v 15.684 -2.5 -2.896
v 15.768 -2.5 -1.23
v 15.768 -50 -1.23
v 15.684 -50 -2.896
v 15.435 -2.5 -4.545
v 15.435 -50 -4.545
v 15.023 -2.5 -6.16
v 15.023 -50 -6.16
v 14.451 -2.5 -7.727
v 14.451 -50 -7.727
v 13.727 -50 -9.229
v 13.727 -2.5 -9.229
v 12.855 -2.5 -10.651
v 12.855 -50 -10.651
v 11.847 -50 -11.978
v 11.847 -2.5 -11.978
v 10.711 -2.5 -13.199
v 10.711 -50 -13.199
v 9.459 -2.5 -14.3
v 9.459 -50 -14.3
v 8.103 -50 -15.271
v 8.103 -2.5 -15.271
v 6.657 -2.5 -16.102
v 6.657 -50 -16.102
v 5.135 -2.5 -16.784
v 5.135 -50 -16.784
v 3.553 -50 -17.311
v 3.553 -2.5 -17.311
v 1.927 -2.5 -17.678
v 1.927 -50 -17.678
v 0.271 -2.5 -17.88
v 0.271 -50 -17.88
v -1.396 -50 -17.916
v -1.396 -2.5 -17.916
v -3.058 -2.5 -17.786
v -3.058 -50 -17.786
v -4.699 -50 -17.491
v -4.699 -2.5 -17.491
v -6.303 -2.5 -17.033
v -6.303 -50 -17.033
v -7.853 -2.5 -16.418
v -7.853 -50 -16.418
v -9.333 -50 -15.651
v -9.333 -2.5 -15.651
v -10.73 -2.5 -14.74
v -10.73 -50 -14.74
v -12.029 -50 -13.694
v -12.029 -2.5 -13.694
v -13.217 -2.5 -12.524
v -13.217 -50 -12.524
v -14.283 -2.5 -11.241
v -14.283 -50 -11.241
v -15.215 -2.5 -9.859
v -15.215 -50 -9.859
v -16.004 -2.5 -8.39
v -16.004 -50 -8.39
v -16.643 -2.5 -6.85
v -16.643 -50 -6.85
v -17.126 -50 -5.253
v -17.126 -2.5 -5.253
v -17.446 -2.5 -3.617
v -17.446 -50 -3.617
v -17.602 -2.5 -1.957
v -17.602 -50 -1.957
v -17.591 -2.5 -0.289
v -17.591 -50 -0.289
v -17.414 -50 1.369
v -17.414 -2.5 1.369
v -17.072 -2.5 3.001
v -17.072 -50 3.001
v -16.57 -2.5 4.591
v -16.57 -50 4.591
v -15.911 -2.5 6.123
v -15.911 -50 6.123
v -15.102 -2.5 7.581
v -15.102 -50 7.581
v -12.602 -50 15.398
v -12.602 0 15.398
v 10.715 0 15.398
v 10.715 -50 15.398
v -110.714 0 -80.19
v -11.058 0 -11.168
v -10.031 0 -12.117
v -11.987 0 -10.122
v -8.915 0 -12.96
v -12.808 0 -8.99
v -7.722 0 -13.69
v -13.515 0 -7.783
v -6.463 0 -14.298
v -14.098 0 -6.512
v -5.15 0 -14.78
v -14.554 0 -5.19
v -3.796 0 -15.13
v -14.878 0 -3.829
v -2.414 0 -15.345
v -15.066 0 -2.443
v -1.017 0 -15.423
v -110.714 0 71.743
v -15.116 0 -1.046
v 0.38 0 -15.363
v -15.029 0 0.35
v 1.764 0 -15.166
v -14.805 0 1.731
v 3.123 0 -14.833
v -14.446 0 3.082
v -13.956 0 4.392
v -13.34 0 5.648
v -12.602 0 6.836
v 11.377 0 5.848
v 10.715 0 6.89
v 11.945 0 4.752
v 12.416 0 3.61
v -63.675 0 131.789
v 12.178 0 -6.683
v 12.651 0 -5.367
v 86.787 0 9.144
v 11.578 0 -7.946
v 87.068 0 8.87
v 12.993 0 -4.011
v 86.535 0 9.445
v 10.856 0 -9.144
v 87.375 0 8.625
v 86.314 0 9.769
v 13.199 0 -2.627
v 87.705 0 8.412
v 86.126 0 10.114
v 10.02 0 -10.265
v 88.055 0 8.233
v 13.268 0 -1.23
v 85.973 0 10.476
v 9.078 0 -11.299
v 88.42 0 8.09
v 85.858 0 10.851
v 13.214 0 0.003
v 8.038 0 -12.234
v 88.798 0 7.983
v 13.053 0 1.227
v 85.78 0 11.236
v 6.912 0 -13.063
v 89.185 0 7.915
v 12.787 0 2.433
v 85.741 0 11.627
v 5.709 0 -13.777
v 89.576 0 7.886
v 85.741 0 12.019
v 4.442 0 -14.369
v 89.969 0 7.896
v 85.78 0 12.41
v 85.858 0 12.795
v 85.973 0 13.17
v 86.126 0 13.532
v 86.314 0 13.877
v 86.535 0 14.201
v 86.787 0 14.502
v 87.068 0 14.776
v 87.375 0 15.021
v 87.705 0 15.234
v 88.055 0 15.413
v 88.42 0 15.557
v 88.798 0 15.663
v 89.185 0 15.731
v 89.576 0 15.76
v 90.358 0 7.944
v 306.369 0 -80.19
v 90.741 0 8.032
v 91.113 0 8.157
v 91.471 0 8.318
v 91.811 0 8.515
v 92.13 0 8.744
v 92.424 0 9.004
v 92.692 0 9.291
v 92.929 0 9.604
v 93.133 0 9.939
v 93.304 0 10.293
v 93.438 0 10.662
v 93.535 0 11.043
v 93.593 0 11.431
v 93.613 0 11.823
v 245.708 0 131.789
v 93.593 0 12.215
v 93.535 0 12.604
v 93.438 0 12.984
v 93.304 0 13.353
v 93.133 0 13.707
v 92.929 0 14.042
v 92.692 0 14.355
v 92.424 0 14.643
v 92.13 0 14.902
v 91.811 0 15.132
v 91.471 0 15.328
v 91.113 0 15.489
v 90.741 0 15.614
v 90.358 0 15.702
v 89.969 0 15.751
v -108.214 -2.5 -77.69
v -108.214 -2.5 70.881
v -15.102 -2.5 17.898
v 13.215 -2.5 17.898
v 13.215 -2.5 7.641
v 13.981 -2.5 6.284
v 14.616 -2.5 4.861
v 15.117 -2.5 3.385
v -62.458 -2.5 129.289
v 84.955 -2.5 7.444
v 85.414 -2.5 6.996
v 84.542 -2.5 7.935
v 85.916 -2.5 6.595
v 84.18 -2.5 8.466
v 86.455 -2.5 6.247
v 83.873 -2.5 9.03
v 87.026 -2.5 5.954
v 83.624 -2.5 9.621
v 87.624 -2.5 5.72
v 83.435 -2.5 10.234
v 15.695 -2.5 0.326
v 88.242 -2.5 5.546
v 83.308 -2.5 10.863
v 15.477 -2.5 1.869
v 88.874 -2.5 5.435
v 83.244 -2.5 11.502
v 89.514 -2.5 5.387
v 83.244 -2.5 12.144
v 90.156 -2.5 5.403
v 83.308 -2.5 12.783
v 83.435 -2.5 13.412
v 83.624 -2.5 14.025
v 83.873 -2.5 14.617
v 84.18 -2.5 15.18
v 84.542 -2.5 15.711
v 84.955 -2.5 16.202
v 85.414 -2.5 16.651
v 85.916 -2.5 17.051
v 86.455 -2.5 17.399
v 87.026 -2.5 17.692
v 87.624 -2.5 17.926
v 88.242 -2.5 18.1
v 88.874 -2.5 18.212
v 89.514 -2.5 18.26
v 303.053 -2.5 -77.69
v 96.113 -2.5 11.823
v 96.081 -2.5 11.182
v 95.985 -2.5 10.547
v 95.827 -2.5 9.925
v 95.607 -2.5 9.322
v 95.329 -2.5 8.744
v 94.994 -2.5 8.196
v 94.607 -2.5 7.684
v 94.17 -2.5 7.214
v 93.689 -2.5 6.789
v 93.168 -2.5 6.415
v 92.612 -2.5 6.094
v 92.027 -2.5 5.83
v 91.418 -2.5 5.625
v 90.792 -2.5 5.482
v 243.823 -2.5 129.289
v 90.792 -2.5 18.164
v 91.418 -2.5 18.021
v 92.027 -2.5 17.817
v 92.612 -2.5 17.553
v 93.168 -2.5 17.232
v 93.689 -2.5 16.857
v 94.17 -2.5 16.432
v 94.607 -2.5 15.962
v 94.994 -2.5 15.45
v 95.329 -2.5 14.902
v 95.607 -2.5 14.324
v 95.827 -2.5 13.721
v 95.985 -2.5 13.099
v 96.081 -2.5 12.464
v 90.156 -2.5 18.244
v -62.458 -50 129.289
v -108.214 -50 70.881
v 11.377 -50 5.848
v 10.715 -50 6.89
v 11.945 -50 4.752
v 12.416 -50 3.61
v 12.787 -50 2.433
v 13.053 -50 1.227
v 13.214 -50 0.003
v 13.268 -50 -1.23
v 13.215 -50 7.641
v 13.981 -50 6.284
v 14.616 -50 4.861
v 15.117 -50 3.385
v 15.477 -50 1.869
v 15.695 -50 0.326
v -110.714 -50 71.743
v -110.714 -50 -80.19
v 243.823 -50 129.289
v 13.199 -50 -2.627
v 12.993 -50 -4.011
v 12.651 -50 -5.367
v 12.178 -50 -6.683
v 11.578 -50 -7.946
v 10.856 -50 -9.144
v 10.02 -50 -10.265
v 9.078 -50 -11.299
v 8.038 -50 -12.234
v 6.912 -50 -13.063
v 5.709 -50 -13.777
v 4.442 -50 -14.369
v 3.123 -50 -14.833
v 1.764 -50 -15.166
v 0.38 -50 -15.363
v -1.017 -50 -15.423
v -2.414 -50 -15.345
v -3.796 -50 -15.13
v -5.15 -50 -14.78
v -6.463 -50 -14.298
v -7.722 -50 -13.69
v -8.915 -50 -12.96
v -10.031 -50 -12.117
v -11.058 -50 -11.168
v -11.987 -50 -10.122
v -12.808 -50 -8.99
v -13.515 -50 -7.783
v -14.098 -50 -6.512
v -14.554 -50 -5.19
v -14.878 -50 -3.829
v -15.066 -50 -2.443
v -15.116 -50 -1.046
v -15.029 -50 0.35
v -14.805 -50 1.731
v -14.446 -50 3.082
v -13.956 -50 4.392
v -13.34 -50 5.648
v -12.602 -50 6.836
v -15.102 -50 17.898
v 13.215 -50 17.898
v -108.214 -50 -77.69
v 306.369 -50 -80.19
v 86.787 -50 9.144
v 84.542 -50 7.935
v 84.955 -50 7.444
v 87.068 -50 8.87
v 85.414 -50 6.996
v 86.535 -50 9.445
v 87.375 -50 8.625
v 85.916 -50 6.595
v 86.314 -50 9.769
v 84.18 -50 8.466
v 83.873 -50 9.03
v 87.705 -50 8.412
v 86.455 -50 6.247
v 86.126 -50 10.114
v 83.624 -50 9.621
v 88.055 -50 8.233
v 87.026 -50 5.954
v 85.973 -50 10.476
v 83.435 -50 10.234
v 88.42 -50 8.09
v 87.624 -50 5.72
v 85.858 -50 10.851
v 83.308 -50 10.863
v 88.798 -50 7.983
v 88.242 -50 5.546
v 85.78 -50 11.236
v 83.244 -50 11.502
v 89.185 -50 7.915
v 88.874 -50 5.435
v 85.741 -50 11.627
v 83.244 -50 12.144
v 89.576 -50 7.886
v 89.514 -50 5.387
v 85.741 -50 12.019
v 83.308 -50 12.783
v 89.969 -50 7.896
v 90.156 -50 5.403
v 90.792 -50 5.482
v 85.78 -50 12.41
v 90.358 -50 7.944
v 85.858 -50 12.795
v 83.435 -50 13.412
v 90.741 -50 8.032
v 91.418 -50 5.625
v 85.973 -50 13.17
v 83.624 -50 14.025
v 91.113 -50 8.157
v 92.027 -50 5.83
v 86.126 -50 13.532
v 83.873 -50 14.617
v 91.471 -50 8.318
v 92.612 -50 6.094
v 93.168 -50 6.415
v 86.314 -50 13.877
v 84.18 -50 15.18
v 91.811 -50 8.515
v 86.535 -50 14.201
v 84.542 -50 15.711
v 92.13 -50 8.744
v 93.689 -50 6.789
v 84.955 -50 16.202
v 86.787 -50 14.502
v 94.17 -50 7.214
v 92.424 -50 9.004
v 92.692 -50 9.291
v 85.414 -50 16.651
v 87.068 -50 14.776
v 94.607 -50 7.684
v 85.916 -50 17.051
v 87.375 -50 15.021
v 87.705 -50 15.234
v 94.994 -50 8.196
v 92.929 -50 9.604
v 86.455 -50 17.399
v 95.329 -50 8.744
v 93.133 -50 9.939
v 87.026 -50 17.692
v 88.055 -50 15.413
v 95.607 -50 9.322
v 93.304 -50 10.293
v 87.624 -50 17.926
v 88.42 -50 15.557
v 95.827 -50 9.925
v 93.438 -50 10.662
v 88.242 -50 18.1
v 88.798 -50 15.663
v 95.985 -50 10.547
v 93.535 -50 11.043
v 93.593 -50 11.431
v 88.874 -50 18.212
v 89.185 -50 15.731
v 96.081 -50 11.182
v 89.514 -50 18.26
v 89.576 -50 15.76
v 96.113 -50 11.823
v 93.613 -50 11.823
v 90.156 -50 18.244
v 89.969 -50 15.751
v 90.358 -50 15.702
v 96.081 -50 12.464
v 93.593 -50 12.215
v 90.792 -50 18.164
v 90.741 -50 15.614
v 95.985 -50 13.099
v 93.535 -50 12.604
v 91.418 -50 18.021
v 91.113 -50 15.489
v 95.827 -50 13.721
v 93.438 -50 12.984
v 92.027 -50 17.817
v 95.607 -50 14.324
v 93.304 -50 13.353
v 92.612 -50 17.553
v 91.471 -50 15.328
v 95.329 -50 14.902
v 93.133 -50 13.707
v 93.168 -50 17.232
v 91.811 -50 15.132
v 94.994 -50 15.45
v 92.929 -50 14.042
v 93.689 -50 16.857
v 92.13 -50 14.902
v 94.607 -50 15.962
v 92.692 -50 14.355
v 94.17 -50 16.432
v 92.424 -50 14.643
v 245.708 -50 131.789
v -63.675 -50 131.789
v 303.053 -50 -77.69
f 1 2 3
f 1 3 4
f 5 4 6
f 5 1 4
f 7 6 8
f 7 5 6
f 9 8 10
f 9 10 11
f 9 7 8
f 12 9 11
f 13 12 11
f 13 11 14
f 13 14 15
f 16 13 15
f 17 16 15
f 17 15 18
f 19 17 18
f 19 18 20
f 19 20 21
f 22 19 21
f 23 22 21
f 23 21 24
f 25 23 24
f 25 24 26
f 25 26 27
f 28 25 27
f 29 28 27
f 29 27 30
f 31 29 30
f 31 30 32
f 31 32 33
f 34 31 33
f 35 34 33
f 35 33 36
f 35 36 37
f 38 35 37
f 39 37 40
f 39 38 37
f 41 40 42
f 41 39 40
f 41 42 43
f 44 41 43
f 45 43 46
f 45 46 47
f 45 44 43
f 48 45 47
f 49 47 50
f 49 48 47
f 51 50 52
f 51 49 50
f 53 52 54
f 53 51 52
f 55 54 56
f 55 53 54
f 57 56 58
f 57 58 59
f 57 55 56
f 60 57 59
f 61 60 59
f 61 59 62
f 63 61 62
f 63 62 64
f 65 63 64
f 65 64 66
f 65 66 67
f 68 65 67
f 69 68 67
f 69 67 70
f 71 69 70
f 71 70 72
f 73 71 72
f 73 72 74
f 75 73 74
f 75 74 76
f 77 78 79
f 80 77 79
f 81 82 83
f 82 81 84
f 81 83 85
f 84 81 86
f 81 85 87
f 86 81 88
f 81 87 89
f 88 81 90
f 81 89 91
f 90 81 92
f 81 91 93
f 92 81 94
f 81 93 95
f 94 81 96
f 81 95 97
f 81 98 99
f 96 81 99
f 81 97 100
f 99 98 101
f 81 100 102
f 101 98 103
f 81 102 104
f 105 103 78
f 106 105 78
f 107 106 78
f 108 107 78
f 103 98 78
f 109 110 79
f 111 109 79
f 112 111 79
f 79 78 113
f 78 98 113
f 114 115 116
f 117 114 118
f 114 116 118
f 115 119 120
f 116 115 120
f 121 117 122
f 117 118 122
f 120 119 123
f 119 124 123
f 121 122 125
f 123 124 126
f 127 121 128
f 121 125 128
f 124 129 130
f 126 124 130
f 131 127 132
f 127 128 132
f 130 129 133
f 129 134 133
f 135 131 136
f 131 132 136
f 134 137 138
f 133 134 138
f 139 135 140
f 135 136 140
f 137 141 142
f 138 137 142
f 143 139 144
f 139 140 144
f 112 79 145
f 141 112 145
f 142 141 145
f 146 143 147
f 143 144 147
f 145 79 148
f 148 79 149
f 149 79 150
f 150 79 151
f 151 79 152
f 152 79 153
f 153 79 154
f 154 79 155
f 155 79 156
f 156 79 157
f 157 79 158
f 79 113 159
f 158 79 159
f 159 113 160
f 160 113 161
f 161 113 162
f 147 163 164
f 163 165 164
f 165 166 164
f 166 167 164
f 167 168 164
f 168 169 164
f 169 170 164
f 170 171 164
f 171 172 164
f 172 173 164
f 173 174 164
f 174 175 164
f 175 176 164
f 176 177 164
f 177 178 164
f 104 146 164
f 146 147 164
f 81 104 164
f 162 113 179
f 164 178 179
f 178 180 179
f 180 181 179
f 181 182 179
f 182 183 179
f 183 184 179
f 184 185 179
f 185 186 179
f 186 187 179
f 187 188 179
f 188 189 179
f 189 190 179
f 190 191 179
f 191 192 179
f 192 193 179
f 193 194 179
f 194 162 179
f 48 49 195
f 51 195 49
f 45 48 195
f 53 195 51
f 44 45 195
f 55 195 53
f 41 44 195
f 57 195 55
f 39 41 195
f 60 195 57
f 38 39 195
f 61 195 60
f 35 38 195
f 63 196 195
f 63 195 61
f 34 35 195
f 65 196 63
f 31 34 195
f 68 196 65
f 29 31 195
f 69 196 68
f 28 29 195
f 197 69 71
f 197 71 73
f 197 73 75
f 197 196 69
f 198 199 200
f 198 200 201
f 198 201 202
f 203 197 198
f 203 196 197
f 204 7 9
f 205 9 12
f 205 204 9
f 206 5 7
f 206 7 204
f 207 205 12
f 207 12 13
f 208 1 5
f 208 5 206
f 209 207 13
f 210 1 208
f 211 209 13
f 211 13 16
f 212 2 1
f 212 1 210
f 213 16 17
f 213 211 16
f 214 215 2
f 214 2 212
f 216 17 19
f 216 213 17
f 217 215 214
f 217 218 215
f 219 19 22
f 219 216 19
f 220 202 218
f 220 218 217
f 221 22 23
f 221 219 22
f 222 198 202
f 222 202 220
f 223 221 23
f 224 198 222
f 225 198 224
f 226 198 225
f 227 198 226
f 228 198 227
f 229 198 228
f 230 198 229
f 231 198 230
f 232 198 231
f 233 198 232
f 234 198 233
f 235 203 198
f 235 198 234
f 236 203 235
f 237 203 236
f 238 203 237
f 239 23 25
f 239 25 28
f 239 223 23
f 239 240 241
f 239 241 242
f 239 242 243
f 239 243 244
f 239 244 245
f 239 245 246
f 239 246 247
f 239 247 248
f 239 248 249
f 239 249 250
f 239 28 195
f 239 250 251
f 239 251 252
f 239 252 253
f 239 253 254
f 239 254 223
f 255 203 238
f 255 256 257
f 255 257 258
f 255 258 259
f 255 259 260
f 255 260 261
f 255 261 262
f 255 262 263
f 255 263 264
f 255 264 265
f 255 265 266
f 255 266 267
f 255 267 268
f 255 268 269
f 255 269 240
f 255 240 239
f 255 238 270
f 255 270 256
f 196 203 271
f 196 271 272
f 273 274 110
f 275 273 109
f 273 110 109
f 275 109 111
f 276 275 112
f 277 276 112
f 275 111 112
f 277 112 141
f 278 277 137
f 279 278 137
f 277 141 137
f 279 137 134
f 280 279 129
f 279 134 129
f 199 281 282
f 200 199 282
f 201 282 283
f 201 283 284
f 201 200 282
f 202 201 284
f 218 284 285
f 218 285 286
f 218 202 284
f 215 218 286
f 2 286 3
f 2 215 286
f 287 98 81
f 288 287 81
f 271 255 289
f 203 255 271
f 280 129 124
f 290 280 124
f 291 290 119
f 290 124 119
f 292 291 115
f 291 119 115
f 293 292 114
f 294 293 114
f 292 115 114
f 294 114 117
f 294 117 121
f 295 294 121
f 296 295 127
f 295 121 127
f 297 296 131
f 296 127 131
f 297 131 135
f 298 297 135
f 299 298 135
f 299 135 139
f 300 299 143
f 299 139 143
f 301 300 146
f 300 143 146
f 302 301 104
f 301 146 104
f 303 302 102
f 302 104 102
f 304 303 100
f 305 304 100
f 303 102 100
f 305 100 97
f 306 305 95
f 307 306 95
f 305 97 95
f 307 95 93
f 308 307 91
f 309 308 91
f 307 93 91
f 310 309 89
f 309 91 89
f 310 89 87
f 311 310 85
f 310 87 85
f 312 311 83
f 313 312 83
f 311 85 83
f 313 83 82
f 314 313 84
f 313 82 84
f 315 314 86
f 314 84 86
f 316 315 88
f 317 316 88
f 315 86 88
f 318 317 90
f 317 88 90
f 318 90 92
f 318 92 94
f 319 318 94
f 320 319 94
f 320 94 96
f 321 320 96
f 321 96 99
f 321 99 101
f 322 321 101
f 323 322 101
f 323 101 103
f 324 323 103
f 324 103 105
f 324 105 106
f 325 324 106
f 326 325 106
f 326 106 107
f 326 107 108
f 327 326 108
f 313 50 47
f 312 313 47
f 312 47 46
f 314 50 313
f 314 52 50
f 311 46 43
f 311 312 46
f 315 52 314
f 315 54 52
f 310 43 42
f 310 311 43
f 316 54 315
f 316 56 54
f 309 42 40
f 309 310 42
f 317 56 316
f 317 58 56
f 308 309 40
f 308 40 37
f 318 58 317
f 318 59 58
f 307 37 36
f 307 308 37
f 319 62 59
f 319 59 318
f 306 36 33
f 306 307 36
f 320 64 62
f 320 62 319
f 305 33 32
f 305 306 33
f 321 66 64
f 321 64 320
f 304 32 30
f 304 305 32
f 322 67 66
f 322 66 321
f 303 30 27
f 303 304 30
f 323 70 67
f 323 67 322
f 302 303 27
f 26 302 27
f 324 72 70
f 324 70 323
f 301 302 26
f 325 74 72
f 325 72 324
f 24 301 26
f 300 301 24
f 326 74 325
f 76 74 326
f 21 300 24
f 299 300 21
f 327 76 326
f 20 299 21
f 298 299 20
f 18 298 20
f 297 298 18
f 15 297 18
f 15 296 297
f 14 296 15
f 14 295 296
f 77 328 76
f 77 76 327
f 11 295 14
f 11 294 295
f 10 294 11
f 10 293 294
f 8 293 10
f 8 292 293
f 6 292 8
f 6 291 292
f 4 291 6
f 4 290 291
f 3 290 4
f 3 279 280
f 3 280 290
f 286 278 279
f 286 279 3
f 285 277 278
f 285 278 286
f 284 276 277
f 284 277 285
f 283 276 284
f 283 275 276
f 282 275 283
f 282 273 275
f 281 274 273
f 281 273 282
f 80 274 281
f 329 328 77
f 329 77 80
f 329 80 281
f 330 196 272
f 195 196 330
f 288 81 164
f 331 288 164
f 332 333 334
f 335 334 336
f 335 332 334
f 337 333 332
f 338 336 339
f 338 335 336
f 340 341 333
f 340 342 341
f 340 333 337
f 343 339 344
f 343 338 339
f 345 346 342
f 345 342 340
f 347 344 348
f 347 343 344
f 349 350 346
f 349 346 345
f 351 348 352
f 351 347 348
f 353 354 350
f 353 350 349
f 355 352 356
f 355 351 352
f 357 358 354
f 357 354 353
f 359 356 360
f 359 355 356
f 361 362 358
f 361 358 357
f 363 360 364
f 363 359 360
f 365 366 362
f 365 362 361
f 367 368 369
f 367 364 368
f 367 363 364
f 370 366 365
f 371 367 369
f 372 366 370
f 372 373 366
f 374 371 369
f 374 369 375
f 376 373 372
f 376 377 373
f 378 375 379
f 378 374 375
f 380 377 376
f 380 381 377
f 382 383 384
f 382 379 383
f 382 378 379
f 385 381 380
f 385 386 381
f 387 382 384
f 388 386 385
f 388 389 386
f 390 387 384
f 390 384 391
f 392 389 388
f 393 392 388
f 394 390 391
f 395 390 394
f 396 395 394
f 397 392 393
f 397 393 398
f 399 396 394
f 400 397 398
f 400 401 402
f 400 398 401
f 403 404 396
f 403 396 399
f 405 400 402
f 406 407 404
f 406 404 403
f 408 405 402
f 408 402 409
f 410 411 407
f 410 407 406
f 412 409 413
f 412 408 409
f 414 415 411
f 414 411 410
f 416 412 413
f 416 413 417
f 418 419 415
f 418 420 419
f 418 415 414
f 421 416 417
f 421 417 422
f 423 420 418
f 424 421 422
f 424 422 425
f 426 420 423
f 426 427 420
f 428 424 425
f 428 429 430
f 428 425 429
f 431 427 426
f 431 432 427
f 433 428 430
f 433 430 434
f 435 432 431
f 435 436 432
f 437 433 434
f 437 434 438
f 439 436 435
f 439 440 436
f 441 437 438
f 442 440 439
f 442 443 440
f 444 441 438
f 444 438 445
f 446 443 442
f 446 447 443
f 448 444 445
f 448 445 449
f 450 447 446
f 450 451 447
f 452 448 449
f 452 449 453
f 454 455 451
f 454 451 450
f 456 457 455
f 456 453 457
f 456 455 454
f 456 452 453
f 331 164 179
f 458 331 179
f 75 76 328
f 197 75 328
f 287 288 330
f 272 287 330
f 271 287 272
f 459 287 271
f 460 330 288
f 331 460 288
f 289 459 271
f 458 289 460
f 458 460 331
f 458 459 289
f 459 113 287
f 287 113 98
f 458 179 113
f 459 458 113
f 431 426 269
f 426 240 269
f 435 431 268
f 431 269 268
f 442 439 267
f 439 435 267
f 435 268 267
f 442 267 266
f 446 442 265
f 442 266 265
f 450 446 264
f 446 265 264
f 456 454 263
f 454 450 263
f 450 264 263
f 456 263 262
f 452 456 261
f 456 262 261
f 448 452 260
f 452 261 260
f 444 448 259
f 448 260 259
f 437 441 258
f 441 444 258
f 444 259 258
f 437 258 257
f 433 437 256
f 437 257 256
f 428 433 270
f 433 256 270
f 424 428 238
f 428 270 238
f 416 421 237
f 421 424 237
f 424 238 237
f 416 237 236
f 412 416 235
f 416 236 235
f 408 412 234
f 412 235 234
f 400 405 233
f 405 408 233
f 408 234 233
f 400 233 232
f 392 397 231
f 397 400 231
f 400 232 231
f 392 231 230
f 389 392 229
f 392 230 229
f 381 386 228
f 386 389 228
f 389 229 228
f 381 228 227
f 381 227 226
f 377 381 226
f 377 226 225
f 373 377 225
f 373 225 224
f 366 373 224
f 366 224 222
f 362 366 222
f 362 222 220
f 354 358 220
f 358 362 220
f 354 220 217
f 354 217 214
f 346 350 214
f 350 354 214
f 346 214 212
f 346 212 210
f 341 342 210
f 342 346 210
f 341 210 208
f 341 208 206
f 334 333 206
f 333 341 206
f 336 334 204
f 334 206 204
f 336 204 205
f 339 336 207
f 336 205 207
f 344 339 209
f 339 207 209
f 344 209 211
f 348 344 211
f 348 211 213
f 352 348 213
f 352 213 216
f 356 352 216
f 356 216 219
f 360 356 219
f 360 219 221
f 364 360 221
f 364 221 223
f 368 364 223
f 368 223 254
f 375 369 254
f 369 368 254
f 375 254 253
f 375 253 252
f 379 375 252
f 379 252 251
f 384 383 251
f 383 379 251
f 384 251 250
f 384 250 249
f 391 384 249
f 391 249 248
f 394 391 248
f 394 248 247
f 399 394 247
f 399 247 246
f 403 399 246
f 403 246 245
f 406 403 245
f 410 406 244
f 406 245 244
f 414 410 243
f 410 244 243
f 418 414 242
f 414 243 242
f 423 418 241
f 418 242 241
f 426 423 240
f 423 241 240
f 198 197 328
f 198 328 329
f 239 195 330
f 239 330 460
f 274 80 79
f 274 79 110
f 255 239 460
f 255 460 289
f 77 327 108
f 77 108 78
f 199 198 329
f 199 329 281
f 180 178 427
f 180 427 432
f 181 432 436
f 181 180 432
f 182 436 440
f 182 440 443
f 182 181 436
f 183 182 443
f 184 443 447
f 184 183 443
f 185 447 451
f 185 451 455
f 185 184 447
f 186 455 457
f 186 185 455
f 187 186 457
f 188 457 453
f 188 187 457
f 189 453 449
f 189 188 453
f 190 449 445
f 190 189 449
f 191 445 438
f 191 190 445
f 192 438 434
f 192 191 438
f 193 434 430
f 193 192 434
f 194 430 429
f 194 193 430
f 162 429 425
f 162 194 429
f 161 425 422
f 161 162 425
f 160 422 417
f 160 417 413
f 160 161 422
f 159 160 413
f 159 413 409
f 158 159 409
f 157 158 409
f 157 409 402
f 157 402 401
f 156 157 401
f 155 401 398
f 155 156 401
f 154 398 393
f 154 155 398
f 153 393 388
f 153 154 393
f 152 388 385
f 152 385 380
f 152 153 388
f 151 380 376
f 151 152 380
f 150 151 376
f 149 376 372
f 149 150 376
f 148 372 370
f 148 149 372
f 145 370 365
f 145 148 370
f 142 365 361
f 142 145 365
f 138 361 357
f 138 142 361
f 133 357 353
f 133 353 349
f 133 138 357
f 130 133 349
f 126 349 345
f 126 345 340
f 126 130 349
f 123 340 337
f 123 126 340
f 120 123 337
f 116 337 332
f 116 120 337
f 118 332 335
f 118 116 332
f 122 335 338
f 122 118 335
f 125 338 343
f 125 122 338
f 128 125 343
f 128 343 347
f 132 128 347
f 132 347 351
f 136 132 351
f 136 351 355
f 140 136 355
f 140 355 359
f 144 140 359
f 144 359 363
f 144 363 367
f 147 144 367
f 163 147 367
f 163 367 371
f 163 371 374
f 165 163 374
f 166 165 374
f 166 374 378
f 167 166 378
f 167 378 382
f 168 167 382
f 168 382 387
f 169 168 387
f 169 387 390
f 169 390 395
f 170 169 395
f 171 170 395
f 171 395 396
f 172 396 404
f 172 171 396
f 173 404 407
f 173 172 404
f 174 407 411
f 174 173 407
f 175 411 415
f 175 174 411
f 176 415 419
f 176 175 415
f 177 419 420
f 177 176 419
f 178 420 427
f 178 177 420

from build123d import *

# Parameters (mm, degrees)
F0_R     = 3.9385625542
F1_DEPTH = 50
F2_T     = -2.5


with BuildPart() as f1:
    # F0 (on Front) → F1 (new body)
    with BuildSketch(Plane.XZ):
        Polygon((-63.6753439903, 131.7894458771), (-110.7138618827, 71.7433527191), (-110.7138618827, -80.1898017526), (306.3688576221, -80.1898017526), (245.7079440355, 131.7894458771), align=None)
        with BuildLine():
            ThreePointArc((10.7150094085, 6.889880588), (12.6143743289, 3.0256211841), (13.267535524, -1.2303708618))
            ThreePointArc((13.267535524, -1.2303708618), (-5.1497771024, -14.7795789773), (-12.6024631263, 6.836061563))
            Line((-12.6024631263, 6.836061563), (-12.6024631263, 15.3979491442))
            Line((-12.6024631263, 15.3979491442), (10.7150094085, 15.3979491442))
            Line((10.7150094085, 15.3979491442), (10.7150094085, 6.889880588))
        make_face(mode=Mode.SUBTRACT)
        with Locations((89.6744132042, 11.8231130764)):
            Circle(F0_R, mode=Mode.SUBTRACT)
    extrude(amount=F1_DEPTH)

    # F2
    f2_openings = [f1.faces().sort_by_distance(p)[0] for p in [
        (86.977321, -50, 21.670217),
    ]]
    offset(amount=F2_T, openings=f2_openings, kind=Kind.INTERSECTION)


solid = f1.part
